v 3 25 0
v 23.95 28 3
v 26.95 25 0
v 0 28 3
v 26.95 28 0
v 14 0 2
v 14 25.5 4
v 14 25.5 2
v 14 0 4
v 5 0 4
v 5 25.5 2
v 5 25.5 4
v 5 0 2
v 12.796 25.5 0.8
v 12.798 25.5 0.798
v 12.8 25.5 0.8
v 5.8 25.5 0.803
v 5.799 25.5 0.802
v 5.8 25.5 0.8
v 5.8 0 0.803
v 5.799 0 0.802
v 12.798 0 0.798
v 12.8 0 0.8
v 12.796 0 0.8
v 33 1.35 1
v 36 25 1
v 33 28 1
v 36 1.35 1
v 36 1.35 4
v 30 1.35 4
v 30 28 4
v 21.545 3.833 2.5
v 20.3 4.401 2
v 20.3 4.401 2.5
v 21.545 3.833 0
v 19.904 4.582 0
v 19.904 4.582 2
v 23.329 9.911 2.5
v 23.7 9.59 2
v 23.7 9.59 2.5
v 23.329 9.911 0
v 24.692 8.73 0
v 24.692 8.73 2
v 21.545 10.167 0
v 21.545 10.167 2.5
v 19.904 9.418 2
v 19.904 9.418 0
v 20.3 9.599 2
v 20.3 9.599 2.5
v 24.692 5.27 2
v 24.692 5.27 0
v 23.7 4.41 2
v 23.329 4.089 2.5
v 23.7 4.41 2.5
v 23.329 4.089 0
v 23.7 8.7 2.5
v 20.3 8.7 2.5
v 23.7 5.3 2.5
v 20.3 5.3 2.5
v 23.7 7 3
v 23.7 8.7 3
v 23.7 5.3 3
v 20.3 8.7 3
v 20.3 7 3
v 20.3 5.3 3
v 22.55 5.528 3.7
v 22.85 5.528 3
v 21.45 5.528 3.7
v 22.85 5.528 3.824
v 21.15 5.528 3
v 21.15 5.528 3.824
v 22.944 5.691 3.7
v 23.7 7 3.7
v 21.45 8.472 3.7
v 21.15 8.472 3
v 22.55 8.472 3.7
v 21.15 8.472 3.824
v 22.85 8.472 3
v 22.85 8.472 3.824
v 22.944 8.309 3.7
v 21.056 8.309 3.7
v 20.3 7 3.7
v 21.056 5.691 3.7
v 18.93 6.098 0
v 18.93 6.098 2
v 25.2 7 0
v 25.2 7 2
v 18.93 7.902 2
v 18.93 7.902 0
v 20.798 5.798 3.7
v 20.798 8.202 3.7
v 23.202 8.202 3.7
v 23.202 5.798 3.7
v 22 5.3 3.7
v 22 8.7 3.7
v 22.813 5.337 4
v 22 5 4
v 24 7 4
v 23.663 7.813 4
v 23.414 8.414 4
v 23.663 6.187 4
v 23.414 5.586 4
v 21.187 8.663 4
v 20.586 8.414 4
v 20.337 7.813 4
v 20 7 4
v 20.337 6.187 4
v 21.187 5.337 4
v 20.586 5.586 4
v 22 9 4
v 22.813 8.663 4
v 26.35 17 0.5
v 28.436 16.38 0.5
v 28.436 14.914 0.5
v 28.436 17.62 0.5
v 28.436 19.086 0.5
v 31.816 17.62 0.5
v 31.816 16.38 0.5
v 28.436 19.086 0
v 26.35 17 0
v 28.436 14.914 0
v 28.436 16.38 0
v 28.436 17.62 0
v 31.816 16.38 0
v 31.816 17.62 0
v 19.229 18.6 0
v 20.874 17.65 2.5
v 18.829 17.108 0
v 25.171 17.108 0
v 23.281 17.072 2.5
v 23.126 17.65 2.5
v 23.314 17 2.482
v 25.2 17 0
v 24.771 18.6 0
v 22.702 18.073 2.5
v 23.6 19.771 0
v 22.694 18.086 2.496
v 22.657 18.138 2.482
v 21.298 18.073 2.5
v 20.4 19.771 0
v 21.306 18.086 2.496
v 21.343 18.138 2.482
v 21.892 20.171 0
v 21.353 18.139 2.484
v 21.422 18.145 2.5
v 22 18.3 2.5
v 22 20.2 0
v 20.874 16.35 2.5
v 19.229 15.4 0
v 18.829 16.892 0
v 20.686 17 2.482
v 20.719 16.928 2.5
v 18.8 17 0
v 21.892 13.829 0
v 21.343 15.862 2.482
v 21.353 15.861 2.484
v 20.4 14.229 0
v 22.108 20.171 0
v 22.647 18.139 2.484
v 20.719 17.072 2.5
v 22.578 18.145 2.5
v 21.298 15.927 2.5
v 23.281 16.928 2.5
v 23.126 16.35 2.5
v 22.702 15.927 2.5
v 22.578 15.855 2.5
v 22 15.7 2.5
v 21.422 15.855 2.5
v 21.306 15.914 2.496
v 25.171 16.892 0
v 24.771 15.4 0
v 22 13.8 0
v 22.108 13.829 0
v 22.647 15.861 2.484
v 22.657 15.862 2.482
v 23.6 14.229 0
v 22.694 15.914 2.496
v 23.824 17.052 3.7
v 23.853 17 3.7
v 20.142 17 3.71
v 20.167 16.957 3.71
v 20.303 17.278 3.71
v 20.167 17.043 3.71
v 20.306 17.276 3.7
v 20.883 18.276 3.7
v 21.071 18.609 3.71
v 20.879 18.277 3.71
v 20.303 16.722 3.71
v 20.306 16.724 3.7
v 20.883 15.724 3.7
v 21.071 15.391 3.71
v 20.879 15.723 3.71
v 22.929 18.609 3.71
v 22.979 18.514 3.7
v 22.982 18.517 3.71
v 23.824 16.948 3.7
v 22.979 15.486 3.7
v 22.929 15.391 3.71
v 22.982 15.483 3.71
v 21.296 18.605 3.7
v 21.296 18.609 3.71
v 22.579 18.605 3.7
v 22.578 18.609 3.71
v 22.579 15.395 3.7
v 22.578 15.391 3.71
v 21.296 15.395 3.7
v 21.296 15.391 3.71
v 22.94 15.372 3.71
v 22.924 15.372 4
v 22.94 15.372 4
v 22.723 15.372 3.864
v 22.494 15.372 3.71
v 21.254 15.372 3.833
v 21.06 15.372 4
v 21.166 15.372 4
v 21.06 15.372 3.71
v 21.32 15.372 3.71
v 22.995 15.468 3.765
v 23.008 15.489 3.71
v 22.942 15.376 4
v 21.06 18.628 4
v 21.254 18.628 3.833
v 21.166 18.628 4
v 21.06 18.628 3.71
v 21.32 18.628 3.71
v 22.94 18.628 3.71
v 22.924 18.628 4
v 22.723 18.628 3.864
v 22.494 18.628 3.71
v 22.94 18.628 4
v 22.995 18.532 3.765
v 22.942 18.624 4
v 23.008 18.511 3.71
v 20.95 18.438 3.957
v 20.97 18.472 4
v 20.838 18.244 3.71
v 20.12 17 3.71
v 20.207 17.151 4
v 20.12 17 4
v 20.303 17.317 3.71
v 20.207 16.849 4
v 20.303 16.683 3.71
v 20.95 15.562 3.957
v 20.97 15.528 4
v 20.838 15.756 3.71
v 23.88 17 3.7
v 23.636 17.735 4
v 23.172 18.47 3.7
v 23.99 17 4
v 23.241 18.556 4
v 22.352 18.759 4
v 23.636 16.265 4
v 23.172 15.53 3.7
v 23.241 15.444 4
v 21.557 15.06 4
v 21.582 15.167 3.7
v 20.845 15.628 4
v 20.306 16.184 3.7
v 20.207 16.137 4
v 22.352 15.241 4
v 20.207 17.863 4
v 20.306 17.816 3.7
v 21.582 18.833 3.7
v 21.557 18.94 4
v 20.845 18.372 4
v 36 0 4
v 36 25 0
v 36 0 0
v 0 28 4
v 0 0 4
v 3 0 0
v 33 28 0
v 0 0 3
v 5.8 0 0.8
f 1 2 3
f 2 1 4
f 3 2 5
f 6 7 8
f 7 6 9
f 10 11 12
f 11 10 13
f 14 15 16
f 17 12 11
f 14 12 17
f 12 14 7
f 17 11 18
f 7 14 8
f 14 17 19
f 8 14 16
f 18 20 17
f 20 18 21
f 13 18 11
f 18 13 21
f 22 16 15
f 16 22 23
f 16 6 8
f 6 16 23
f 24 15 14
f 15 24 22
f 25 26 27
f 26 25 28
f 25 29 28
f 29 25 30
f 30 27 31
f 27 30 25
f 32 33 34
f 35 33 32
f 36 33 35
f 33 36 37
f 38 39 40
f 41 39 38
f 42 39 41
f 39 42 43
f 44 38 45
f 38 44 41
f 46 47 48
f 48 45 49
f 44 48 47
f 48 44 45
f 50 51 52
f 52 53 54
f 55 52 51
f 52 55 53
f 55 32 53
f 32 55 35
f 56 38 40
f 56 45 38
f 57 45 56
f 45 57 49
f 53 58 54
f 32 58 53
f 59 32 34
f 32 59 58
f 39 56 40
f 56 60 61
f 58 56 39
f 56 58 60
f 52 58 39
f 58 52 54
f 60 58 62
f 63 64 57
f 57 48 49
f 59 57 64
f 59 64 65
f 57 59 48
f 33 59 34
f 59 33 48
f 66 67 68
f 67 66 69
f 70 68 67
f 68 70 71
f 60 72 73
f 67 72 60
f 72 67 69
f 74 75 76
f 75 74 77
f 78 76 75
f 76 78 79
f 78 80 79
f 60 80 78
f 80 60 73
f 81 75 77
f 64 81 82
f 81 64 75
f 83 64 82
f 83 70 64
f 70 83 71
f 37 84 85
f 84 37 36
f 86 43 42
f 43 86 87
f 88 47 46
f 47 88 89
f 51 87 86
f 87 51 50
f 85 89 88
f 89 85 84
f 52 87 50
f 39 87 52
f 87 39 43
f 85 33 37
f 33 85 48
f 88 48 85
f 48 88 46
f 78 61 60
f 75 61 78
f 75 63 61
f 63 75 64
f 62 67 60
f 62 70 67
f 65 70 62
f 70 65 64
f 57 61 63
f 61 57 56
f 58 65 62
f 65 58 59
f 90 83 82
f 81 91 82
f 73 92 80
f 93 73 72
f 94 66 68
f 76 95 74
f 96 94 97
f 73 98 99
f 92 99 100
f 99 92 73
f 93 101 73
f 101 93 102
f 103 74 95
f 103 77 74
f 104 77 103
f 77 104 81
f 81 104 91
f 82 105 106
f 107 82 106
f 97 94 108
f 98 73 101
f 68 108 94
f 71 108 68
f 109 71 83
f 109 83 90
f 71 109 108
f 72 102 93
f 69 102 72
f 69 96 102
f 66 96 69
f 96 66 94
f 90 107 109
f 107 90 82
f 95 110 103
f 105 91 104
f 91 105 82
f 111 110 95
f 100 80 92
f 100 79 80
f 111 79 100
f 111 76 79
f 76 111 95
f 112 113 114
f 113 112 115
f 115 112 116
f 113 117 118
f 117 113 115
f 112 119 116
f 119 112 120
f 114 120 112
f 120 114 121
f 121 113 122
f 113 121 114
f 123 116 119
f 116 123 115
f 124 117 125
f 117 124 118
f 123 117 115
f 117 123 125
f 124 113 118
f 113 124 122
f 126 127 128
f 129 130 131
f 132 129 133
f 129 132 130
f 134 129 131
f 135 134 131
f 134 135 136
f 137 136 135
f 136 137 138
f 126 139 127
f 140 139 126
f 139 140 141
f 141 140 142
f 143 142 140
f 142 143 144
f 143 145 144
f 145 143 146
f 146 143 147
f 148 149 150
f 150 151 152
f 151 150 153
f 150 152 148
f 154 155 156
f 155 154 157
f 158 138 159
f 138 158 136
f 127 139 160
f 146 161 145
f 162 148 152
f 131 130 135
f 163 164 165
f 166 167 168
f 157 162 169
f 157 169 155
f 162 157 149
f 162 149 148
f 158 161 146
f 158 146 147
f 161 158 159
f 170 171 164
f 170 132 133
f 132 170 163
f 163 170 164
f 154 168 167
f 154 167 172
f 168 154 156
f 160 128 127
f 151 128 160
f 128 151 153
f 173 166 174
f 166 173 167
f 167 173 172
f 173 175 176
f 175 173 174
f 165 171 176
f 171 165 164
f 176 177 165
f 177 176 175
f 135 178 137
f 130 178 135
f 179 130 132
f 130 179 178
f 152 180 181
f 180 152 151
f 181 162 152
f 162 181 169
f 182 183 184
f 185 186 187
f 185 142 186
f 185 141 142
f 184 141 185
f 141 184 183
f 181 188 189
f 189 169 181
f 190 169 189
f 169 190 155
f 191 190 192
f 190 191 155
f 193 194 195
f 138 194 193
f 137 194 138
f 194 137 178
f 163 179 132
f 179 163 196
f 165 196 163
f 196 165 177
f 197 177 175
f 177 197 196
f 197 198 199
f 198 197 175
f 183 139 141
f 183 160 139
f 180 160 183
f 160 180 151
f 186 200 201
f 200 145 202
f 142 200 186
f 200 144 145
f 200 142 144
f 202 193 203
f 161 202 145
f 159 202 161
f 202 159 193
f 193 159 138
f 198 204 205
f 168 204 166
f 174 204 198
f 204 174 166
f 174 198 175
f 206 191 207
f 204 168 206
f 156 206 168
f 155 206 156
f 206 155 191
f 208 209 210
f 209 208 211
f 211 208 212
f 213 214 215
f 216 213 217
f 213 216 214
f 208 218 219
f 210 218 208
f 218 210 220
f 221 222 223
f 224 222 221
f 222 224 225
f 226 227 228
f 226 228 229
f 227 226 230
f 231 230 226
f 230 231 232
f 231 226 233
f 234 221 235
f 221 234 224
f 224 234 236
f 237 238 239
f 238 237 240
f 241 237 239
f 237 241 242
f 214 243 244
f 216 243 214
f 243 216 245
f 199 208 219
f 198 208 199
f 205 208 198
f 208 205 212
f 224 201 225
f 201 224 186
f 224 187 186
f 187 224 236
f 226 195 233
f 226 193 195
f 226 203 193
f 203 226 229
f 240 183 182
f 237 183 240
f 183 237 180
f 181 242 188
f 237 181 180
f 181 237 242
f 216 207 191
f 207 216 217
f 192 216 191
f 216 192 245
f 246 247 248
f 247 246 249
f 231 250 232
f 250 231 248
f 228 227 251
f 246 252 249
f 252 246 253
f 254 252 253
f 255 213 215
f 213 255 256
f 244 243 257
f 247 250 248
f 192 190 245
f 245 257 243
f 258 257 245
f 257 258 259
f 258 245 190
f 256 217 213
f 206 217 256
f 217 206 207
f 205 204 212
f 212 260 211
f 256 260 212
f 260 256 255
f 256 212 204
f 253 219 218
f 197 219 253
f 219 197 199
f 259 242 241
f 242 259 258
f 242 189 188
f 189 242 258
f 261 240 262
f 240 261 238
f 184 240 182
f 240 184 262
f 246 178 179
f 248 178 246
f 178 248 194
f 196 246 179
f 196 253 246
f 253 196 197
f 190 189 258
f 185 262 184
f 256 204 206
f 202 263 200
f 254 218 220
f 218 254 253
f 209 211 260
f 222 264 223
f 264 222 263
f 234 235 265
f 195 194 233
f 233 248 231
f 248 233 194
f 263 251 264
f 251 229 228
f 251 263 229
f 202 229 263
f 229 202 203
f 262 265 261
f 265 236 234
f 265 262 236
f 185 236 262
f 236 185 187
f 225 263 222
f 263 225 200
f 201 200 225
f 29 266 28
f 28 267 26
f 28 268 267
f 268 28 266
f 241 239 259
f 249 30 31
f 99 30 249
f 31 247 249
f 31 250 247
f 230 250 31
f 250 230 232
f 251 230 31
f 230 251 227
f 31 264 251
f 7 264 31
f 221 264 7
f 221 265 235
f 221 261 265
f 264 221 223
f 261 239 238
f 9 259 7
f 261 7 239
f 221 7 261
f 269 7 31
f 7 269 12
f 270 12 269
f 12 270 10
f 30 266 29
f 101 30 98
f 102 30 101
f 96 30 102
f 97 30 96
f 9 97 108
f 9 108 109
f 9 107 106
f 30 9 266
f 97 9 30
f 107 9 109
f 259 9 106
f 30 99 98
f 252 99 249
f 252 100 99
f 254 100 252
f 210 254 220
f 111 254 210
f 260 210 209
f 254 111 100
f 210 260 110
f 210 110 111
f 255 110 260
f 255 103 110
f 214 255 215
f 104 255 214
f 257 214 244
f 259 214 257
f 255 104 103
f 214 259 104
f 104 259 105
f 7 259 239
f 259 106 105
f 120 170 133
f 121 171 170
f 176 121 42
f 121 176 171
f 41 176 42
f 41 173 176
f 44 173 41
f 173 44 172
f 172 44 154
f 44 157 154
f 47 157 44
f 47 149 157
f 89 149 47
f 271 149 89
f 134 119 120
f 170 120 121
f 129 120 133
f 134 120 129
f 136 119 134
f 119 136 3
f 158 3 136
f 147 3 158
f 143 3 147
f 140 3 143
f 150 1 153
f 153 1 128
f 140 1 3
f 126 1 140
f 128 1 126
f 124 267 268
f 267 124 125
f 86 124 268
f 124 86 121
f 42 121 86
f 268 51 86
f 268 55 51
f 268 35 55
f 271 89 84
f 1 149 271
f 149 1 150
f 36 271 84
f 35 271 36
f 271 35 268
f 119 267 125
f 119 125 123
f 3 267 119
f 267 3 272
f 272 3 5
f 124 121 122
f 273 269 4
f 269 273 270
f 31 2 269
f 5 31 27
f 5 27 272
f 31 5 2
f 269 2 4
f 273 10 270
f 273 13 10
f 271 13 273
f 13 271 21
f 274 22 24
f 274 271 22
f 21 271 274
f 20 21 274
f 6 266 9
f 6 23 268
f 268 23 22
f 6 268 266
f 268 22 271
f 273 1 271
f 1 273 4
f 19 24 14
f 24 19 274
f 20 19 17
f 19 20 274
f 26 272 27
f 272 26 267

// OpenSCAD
// PIRANHA iteration1
// fs cover
// GNU GPL v3
// Usan Siriwardana <usiriwar@uwaterloo.ca> and contributors
// based on Prusa i3 MK3S
// https://reprap.org/wiki/Prusa_i3_MK3

// (all scad files are in printing orientation, so this part is technically upside down)

difference(){
	cube([36, 28, 4]);
	
	// top chamfers (here they're on the botom since it's in printing orientation)
	translate([3, -0.5, 0])rotate([0, 180+45, 0])cube([10, 28 + 1, 10]);
	difference(){
		translate([-1, 28 - 3, 0])rotate([-45, 0, 0])cube([26.95 + 1, 10, 10]);
		translate([26.95, 28-3, 0])rotate([0, -45, 0])cube([10, 10, 10]);
	}
	
	// PCB cutout	
	translate([5, -1, 2]){
		cube([9, 25.5 + 1, 2 + 1]);
		rotate([0, 56.31, 0])cube([1.44, 25.5 + 1, 1.44]);
		translate([9, 0, 0])rotate([0, 180+45, 0])cube([1.7, 25.5 + 1, 1.7]);
	}
	translate([5.8, -1, 0.8])cube([7, 25.5 + 1, 2]);
	
	// handle thing
	translate([33, 1.35, 1]){
		cube([4, 30, 4]);
		rotate([0, -45, 0])cube([4, 30, 5]);
	}
	translate([36 - 3, 28, -0.5])rotate([0, 0, -45])cube([5, 5, 5]);
	
	// bolt hole
	translate([22, 7, -0.5]){
		cylinder(h = 4 + 1, r = 1.7);
		cylinder(h = 2 + 0.5, r = 3.2);
		intersection(){
			cylinder(h = 2.5 + 0.5, r = 3.2);
			cube([3.4, 10, 6], center=true);
		}
		cube([3.4, 3.4, 6 + 1], center=true);
		translate([0, 0, 4 + 0.5 - 0.3])cylinder(h = 0.6, r1 = 1.7, r2 = 2.3);
	}
	

	// fillament hole
	translate([22, 7 + 10, -0.5]){
		cylinder(h =  0.5 + 2.5, r1 = 3.58, r2 = 1.3);
		translate([0, 0, 0.5 + 2.5 - 0.05])cylinder(h = 1.31, r1 = 1.3, r2 = 1.88);
		translate([0, 0, 0.5 + 2.5 + 1.31 - 0.05*2])cylinder(h = 1.31, r1 = 1.88, r2 = 1.88);
		translate([0, 0, 4 + 0.5 - 0.3])cylinder(h = 0.6, r1 = 1.88, r2 = 2.1);

		// arrow
		translate([3.2 + 1.15, 0, 0]){
			difference(){
				rotate([0, 0, -45])cube([3, 3, 1]);
				translate([sqrt(3.2+1.15), -sqrt(3.2+1.15) - 1, 0])cube([10, 10, 10]);
			}
			translate([3.38/2 + sqrt(3.2 + 1.15) - 0.1, 0, 0.5])cube([3.38 + 2*0.1, 1.24, 1], center=true);
		}
	}
}
